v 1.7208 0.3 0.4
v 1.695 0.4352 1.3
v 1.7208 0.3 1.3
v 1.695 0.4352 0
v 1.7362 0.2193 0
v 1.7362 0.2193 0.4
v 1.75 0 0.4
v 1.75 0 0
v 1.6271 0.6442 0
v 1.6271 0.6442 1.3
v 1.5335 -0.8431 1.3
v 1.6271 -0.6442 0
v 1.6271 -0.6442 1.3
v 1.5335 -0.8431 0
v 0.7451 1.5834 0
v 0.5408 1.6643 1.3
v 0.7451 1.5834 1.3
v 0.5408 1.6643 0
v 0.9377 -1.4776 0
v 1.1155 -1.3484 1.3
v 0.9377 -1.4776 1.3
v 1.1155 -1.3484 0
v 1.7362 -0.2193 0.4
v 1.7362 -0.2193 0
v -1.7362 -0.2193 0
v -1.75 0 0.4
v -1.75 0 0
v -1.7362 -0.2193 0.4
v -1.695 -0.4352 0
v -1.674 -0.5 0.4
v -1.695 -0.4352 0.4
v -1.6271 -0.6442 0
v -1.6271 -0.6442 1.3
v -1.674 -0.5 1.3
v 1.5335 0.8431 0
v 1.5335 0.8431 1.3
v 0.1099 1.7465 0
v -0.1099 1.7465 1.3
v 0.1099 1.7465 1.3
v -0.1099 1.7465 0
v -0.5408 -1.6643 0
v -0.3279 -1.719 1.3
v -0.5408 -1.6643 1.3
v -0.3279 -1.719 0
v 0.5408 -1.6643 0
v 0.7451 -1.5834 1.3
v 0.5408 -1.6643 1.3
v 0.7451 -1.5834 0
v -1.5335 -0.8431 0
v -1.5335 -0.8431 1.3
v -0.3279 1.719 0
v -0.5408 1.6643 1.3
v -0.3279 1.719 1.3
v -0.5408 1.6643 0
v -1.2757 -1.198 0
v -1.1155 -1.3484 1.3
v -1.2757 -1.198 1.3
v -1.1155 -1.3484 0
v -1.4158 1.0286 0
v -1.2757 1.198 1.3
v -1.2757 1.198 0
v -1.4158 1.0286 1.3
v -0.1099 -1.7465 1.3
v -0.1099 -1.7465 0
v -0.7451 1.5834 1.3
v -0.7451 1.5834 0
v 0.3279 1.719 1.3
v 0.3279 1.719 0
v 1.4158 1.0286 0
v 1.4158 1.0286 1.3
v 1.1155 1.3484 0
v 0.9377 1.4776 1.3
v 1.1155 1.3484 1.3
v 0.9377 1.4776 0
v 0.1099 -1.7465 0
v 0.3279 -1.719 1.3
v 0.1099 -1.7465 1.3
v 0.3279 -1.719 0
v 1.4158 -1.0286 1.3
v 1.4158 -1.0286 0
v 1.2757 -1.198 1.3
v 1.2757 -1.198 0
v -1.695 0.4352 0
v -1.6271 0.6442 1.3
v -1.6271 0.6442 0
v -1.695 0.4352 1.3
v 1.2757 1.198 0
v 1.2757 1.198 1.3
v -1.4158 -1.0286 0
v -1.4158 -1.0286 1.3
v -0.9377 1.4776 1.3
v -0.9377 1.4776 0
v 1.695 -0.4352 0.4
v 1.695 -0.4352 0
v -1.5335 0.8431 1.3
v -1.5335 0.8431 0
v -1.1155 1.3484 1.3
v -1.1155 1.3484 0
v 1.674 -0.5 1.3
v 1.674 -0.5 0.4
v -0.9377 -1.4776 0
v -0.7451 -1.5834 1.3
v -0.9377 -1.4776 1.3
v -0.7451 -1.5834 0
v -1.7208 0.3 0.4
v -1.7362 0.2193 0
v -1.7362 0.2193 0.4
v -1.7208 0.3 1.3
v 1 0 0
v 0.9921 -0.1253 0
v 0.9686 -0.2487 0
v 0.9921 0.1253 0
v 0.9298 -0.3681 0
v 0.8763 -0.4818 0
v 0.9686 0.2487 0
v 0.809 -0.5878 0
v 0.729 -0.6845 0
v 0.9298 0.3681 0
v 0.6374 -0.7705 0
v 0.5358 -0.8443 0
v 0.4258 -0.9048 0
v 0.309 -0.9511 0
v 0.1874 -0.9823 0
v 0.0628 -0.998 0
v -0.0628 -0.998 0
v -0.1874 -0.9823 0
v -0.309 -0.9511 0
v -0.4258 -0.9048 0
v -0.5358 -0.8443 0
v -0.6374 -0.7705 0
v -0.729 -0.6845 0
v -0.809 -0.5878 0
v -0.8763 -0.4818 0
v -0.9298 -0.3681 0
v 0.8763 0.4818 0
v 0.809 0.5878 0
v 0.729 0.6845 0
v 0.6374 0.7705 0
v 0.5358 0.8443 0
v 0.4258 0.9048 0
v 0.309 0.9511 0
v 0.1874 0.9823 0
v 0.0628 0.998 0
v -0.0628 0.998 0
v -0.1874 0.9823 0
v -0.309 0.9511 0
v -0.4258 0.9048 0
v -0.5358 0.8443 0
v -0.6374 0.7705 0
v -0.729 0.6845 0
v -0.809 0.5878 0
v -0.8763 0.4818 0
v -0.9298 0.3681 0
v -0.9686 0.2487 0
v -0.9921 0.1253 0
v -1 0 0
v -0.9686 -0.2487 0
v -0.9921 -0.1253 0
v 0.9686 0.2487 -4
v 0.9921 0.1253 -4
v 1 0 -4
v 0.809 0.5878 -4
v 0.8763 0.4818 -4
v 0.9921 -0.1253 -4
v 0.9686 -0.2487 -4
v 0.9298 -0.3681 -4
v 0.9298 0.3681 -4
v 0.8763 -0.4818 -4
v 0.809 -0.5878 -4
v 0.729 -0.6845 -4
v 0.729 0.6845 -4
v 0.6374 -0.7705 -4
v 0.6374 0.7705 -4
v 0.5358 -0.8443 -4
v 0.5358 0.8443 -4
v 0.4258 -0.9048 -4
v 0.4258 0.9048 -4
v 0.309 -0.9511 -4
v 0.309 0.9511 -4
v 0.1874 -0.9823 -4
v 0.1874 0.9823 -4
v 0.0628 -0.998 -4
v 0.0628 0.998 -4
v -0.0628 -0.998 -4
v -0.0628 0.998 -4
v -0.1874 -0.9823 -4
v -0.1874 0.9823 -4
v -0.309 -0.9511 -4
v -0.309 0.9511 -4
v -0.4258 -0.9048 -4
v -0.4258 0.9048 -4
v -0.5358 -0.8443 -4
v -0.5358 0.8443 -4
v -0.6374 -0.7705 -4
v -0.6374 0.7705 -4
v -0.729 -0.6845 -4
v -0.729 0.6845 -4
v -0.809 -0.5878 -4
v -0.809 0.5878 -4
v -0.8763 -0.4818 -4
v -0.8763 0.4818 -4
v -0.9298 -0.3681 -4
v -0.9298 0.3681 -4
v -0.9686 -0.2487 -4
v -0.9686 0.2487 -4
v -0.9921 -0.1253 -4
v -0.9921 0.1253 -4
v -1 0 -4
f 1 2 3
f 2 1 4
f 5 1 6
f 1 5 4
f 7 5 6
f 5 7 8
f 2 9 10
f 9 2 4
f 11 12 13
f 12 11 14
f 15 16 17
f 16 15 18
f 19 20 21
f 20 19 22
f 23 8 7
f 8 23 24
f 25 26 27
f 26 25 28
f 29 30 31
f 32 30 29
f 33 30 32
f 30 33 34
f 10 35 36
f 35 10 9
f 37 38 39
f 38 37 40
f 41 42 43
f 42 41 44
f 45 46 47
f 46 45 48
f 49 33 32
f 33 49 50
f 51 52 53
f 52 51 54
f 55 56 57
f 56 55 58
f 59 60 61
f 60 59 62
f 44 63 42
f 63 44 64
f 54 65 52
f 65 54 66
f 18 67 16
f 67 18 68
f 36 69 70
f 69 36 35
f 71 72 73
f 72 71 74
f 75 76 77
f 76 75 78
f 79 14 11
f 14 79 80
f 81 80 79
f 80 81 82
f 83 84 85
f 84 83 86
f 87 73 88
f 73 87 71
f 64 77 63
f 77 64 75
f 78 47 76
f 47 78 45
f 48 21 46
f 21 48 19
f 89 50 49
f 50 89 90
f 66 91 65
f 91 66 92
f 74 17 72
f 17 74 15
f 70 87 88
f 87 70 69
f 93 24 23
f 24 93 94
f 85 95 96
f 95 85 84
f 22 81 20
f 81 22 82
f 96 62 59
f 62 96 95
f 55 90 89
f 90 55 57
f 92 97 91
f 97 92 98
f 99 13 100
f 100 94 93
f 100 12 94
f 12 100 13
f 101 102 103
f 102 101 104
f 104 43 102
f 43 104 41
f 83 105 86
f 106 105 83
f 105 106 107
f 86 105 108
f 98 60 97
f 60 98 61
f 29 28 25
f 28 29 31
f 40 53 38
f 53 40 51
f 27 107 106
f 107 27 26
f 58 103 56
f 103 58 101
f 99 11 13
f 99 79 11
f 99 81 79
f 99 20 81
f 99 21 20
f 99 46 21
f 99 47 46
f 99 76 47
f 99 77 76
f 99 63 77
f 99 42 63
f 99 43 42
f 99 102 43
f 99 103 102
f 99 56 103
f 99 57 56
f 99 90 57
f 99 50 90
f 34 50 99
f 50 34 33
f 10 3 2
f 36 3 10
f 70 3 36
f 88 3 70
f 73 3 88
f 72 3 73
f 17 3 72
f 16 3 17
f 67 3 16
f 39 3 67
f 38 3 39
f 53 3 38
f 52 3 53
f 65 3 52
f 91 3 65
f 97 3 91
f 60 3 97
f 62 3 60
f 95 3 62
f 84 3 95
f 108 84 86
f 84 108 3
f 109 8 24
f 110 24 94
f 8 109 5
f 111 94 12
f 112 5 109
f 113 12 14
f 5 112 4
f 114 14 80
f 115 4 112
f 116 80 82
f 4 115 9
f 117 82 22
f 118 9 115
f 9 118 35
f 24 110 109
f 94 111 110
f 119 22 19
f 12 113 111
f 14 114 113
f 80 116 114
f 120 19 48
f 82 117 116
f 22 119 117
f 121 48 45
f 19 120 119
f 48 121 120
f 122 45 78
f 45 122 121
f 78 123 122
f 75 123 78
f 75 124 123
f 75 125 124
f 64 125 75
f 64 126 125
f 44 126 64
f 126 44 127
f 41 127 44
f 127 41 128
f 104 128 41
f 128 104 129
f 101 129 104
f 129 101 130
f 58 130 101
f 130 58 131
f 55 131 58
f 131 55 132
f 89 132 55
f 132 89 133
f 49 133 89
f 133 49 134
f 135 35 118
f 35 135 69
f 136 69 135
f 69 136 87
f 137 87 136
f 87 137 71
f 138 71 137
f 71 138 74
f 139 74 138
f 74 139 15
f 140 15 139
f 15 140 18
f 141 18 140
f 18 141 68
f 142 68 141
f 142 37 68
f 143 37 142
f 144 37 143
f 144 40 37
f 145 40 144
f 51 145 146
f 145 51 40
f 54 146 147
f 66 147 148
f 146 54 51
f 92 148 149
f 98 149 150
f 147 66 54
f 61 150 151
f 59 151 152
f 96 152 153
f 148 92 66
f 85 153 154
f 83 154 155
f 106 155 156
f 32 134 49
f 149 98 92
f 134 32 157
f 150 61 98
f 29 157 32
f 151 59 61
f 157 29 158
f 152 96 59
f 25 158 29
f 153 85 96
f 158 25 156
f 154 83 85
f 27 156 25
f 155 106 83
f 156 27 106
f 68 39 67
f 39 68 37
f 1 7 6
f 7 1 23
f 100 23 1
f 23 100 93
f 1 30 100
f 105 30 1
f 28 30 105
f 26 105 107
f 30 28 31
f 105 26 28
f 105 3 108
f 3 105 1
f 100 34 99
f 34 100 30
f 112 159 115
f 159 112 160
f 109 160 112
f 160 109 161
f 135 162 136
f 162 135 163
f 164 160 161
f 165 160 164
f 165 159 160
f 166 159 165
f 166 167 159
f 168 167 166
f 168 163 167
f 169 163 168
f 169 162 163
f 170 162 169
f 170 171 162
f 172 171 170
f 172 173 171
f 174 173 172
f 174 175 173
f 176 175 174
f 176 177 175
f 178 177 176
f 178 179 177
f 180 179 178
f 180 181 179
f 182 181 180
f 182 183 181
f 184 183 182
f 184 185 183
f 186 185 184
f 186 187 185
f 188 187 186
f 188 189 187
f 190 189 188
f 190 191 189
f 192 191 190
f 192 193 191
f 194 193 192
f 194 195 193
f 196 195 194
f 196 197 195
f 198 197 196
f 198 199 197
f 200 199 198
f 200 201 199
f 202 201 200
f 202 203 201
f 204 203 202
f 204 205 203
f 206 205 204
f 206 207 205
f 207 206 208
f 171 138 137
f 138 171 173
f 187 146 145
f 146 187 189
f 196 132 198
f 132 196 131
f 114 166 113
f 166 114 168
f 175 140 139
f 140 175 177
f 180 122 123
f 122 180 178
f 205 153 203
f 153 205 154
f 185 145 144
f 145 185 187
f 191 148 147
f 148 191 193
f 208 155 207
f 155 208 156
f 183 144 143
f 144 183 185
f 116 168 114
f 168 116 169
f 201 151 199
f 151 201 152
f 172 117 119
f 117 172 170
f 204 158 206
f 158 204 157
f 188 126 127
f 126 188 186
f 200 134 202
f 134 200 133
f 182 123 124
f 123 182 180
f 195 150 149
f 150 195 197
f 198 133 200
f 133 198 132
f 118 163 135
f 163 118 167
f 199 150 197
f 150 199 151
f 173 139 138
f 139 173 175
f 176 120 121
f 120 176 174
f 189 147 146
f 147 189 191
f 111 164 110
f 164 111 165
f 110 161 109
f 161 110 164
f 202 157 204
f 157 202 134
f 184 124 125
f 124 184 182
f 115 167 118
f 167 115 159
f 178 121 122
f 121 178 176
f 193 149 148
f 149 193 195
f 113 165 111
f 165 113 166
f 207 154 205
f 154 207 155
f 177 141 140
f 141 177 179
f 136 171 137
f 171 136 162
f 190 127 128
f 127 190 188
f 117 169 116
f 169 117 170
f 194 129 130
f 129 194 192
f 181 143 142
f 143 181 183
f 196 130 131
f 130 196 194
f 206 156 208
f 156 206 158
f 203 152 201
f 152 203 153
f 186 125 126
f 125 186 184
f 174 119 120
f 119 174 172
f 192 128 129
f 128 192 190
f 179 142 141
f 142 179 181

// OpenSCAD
$fn = 50;

color([.7, .7, .7]) union () {
  difference () {
    cylinder(d = 3.5, h = 1.3);
    translate([- 3.5 / 2, - 1 / 2, 1.3 - 0.9]) cube([3.5, 0.8, 0.9]);
  }
  
  translate([0, 0, -4]) cylinder(d = 2, h = 4);
}
